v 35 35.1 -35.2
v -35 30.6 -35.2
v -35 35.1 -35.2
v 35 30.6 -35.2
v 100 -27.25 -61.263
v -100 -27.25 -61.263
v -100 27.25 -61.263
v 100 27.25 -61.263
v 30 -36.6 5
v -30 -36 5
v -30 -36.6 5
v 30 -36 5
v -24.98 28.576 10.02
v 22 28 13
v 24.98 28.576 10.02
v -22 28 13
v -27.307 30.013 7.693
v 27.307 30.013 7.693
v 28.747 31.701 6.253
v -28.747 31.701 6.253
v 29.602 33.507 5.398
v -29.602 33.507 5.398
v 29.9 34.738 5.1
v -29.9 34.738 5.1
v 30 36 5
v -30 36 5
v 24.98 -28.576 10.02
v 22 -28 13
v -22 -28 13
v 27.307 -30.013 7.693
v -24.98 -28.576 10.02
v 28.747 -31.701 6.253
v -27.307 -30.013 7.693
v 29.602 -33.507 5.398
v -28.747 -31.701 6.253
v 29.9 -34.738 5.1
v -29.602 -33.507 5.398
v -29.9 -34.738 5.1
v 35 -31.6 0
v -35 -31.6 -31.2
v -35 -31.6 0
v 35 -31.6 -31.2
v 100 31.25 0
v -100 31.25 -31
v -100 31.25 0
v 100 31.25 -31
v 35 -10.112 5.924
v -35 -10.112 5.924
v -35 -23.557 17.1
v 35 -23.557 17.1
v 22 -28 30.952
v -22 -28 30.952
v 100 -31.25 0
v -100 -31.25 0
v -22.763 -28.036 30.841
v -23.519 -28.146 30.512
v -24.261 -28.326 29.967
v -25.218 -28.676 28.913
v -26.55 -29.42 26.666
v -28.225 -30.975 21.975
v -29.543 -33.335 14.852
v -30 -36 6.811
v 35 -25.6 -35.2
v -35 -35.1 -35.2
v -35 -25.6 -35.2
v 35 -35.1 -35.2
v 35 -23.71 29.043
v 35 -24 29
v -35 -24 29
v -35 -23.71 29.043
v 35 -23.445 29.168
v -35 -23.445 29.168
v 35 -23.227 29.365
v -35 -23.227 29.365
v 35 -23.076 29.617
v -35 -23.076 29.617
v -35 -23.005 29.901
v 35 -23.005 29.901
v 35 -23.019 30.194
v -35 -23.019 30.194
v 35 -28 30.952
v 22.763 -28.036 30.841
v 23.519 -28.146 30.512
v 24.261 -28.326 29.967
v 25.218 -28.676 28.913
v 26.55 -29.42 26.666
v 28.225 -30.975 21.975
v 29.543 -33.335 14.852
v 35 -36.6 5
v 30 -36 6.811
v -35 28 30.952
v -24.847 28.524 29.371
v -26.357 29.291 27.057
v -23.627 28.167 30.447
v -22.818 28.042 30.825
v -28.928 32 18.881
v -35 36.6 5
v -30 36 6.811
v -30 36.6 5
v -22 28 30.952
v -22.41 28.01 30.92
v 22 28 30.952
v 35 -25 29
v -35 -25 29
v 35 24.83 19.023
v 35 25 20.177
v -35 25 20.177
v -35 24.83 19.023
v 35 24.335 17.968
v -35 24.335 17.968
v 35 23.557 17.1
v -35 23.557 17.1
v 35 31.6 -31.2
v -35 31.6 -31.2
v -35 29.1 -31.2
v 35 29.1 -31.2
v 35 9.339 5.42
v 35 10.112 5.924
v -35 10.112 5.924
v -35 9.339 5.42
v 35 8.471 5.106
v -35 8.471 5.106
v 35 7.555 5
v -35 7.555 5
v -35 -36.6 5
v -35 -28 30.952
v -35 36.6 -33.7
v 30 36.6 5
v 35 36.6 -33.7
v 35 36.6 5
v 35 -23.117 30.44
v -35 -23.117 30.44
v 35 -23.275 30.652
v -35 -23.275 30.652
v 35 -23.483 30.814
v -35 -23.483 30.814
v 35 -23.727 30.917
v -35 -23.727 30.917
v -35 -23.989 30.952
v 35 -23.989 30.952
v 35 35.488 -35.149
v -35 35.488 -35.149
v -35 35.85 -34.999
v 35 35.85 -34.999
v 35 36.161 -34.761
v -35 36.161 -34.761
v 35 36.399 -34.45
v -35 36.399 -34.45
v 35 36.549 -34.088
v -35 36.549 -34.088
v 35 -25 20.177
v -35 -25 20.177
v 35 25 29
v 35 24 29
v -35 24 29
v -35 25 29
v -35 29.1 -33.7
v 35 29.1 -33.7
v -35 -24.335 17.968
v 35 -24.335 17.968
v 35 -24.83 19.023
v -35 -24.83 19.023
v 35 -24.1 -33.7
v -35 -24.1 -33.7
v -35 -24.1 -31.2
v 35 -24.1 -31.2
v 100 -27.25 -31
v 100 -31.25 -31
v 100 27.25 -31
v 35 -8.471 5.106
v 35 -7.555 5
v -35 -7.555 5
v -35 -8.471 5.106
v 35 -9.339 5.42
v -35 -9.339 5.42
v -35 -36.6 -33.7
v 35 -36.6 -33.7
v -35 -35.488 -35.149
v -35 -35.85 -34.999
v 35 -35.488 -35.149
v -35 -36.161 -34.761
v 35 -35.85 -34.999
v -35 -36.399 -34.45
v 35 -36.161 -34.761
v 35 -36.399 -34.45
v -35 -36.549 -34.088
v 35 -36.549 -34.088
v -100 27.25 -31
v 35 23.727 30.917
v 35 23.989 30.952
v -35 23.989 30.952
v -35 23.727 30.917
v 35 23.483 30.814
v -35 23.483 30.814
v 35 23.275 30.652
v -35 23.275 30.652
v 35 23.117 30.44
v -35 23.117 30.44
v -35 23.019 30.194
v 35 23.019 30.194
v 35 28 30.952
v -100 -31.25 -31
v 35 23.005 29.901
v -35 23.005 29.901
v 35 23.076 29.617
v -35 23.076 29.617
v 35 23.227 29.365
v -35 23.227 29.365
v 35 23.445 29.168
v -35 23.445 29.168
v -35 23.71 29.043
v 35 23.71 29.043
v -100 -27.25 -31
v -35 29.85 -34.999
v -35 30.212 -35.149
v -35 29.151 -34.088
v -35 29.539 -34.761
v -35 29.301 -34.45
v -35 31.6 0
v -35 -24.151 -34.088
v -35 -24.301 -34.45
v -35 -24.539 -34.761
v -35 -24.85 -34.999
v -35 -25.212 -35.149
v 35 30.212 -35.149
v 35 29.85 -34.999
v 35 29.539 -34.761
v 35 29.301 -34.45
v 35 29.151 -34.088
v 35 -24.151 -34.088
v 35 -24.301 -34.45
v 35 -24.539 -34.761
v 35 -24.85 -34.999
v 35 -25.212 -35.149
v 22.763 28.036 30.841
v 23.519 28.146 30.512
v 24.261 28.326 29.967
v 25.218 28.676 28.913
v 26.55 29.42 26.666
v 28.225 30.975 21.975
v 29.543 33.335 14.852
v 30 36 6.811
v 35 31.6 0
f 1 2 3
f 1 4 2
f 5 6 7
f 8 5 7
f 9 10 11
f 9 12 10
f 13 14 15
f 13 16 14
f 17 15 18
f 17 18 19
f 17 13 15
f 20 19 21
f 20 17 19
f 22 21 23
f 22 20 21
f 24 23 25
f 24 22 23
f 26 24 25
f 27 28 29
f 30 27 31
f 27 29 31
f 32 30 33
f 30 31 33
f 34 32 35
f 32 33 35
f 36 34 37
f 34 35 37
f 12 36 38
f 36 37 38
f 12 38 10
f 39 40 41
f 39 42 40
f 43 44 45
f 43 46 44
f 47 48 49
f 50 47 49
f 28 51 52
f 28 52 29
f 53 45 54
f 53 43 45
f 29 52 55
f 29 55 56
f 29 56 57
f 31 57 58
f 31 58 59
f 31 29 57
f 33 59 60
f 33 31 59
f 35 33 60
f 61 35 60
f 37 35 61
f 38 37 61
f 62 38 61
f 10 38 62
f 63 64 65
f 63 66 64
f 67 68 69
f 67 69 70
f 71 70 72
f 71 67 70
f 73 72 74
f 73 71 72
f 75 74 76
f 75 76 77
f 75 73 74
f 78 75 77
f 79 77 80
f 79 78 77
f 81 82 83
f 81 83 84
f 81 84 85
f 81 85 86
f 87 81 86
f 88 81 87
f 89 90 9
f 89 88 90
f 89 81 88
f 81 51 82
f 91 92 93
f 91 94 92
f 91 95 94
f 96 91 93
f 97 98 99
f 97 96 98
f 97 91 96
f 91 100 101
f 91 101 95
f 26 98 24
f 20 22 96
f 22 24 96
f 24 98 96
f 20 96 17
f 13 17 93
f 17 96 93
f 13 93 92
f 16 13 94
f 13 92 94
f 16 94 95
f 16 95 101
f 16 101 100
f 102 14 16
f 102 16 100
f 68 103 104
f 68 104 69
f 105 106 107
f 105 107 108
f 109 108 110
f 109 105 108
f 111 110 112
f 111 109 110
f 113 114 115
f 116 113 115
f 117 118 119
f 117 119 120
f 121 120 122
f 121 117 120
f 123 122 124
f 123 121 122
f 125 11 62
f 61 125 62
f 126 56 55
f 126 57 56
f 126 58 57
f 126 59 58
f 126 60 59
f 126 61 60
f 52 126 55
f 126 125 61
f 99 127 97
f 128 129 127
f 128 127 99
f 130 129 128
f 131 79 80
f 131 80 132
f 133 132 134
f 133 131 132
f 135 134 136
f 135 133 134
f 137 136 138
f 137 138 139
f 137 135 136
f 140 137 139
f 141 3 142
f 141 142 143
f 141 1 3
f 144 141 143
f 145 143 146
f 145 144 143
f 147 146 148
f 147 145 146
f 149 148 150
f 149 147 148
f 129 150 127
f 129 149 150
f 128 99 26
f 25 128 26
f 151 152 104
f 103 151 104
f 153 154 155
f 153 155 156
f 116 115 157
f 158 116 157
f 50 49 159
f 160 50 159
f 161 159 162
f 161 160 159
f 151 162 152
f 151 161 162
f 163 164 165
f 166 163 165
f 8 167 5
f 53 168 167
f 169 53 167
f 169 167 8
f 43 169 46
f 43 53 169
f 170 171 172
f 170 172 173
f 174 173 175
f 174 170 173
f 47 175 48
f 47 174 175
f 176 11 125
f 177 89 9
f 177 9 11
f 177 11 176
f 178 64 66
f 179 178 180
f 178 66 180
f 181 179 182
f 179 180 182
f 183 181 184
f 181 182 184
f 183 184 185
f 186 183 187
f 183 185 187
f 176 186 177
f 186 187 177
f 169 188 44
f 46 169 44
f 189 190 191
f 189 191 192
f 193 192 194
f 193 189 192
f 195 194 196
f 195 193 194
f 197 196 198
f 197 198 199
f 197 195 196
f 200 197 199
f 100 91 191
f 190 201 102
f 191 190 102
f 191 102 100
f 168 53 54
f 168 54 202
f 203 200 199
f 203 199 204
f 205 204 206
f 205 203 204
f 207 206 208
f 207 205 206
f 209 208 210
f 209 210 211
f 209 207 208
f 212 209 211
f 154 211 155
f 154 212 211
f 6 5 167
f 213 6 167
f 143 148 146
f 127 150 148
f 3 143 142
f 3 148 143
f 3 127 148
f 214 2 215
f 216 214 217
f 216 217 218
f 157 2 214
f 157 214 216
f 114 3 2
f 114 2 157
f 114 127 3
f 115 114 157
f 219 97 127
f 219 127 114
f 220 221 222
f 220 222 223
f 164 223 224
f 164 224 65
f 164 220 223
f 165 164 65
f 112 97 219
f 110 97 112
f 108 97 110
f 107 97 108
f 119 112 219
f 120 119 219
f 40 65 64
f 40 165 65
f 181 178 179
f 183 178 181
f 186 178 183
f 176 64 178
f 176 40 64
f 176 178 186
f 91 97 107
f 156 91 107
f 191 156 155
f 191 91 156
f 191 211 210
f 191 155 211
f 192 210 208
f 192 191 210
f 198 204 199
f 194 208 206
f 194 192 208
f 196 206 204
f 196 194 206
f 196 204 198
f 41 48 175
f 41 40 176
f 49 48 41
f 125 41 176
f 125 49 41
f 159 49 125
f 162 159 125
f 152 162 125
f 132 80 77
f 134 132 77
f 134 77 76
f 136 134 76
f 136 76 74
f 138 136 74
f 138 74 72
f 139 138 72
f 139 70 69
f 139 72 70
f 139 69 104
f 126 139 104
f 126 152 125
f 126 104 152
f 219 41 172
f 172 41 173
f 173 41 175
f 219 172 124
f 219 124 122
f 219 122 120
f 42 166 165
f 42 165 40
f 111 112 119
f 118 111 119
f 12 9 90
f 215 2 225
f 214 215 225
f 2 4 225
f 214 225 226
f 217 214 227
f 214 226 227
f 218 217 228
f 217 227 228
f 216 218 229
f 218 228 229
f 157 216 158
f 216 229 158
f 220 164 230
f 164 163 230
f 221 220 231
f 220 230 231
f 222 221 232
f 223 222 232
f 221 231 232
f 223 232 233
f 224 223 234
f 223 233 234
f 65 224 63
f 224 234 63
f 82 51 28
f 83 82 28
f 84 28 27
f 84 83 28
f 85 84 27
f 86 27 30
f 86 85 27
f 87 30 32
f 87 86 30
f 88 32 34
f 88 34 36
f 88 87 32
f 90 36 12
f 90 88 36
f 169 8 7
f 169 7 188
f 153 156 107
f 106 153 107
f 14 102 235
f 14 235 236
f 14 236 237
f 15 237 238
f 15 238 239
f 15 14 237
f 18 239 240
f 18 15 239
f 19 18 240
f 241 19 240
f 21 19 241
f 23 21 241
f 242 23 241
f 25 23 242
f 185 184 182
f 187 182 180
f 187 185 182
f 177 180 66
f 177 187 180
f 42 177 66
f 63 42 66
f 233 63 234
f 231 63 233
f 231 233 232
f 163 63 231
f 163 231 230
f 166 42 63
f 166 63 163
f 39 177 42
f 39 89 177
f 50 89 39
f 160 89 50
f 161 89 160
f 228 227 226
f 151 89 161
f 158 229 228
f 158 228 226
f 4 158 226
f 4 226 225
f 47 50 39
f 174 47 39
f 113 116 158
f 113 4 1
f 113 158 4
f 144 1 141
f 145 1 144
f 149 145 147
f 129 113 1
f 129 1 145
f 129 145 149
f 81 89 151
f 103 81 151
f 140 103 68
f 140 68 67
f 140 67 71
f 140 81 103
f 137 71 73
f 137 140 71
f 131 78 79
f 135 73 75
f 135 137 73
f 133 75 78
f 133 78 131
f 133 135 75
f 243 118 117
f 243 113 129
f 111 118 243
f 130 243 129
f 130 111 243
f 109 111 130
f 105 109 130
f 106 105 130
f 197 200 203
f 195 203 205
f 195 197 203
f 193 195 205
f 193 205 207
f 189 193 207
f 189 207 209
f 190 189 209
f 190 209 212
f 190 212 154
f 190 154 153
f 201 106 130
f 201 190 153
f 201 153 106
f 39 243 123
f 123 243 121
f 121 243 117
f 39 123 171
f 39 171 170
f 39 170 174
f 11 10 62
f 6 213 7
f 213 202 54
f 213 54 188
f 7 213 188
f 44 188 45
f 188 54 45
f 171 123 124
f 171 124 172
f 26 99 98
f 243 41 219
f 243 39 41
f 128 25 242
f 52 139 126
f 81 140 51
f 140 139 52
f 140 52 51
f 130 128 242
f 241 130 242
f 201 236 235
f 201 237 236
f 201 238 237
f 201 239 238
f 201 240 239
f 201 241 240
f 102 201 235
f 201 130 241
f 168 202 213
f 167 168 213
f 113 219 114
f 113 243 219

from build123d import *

# Parameters (mm, degrees)
F0_W      = 54.5
F0_H      = 30.2627416849
F1_DEPTH  = 100
F2_W      = 5
F2_H      = 4
F3_DEPTH  = 35
F5_DEPTH  = 70
F8_DEPTH  = 5
F10_DEPTH = 5
F11_R     = 8
F12_R     = 1.5


with BuildPart() as f1:
    # F0 (on Right) → F1 (new body, symmetric)
    with BuildSketch(Plane.YZ):
        Polygon((31.25, 0), (-31.25, 0), (-31.25, -31), (-27.25, -31), (27.25, -31), (31.25, -31), align=None)
        with Locations((0, -46.1313708425)):
            Rectangle(F0_W, F0_H)
    extrude(amount=F1_DEPTH, both=True)


with BuildPart() as f3:
    # F2 (on Right) → F3 (new body, symmetric)
    with BuildSketch(Plane.YZ):
        Polygon((0, 5), (0, 0), (31.6, 0), (31.6, -31.2), (29.1, -31.2), (29.1, -35.2), (36.6, -35.2), (36.6, 5), align=None)
        Polygon((-31.6, 0), (0, 0), (0, 5), (-36.6, 5), (-36.6, -35.2), (-29.1, -35.2), (-29.1, -31.2), (-31.6, -31.2), align=None)
        with Locations((-26.6, -33.2)):
            Rectangle(F2_W, F2_H)
    extrude(amount=F3_DEPTH, both=True)

    # F4 (on face) → F5 (join, through all)
    with BuildSketch(Plane.YZ.offset(35)):
        with BuildLine():
            Line((-28, 5), (-7.5545838353, 5))
            ThreePointArc((-7.5545838353, 5), (-8.9139701192, 5.238076432), (-10.1115374849, 5.9239655343))
            Line((-10.1115374849, 5.9239655343), (-23.5569536496, 17.1004677212))
            ThreePointArc((-23.5569536496, 17.1004677212), (-24.6213129248, 18.4776517812), (-25, 20.1765021869))
            Line((-25, 20.1765021869), (-25, 29))
            Line((-25, 29), (-24, 29))
            ThreePointArc((-24, 29), (-23.227192279, 29.3653597662), (-23.0190902545, 30.1944635473))
            ThreePointArc((-23.0190902545, 30.1944635473), (-23.3738776782, 30.7398834056), (-23.9891411693, 30.9515618745))
            Line((-23.9891411693, 30.9515618745), (-28, 30.9515618745))
            Line((-28, 30.9515618745), (-28, 5))
        make_face()
        with BuildLine():
            Line((25, 5), (25, 20.1765021869))
            ThreePointArc((25, 20.1765021869), (24.6213129248, 18.4776517812), (23.5569536496, 17.1004677212))
            Line((23.5569536496, 17.1004677212), (10.1115374849, 5.9239655343))
            ThreePointArc((10.1115374849, 5.9239655343), (8.9139701192, 5.238076432), (7.5545838353, 5))
            Line((7.5545838353, 5), (25, 5))
        make_face()
        with BuildLine():
            Line((24, 29), (25, 29))
            Line((25, 29), (25, 20.1765021869))
            Line((25, 20.1765021869), (25, 5))
            Line((25, 5), (28, 5))
            Line((28, 5), (28, 30.9515618745))
            Line((28, 30.9515618745), (23.9891411693, 30.9515618745))
            ThreePointArc((23.9891411693, 30.9515618745), (23.3738776782, 30.7398834056), (23.0190902545, 30.1944635473))
            ThreePointArc((23.0190902545, 30.1944635473), (23.227192279, 29.3653597662), (24, 29))
        make_face()
    extrude(amount=-F5_DEPTH)

    # F6: union 

    # F7 (on face) → F8 (join)
    with BuildSketch(Plane.YZ.offset(35)):
        Polygon((28, 30.9515618745), (28, 5), (36.6, 5), align=None)
        Polygon((-28, 30.9515618745), (-36.6, 5), (-28, 5), align=None)
    extrude(amount=-F8_DEPTH)

    # F9 (on face) → F10 (join)
    with BuildSketch(Plane(origin=(-35, 0, 0), x_dir=(0, -1, 0), z_dir=(-1, 0, 0))):
        Polygon((-28, 30.9515618745), (-36.6, 5), (-28, 5), align=None)
        Polygon((36.6, 5), (28, 30.9515618745), (28, 5), align=None)
    extrude(amount=-F10_DEPTH)

    # F11
    f11_edges = [f3.edges().sort_by_distance(p)[0] for p in [
        (0, 28, 5),
        (30, -28, 17.975781),
        (-30, -28, 17.975781),
        (30, 28, 17.975781),
        (-30, 28, 17.975781),
        (0, -28, 5),
    ]]
    fillet(f11_edges, radius=F11_R)

    # F12
    f12_edges = [f3.edges().sort_by_distance(p)[0] for p in [
        (0, -36.6, -35.2),
        (0, 36.6, -35.2),
        (0, 29.1, -35.2),
        (0, -24.1, -35.2),
    ]]
    fillet(f12_edges, radius=F12_R)


solid = Compound([f1.part, f3.part])
